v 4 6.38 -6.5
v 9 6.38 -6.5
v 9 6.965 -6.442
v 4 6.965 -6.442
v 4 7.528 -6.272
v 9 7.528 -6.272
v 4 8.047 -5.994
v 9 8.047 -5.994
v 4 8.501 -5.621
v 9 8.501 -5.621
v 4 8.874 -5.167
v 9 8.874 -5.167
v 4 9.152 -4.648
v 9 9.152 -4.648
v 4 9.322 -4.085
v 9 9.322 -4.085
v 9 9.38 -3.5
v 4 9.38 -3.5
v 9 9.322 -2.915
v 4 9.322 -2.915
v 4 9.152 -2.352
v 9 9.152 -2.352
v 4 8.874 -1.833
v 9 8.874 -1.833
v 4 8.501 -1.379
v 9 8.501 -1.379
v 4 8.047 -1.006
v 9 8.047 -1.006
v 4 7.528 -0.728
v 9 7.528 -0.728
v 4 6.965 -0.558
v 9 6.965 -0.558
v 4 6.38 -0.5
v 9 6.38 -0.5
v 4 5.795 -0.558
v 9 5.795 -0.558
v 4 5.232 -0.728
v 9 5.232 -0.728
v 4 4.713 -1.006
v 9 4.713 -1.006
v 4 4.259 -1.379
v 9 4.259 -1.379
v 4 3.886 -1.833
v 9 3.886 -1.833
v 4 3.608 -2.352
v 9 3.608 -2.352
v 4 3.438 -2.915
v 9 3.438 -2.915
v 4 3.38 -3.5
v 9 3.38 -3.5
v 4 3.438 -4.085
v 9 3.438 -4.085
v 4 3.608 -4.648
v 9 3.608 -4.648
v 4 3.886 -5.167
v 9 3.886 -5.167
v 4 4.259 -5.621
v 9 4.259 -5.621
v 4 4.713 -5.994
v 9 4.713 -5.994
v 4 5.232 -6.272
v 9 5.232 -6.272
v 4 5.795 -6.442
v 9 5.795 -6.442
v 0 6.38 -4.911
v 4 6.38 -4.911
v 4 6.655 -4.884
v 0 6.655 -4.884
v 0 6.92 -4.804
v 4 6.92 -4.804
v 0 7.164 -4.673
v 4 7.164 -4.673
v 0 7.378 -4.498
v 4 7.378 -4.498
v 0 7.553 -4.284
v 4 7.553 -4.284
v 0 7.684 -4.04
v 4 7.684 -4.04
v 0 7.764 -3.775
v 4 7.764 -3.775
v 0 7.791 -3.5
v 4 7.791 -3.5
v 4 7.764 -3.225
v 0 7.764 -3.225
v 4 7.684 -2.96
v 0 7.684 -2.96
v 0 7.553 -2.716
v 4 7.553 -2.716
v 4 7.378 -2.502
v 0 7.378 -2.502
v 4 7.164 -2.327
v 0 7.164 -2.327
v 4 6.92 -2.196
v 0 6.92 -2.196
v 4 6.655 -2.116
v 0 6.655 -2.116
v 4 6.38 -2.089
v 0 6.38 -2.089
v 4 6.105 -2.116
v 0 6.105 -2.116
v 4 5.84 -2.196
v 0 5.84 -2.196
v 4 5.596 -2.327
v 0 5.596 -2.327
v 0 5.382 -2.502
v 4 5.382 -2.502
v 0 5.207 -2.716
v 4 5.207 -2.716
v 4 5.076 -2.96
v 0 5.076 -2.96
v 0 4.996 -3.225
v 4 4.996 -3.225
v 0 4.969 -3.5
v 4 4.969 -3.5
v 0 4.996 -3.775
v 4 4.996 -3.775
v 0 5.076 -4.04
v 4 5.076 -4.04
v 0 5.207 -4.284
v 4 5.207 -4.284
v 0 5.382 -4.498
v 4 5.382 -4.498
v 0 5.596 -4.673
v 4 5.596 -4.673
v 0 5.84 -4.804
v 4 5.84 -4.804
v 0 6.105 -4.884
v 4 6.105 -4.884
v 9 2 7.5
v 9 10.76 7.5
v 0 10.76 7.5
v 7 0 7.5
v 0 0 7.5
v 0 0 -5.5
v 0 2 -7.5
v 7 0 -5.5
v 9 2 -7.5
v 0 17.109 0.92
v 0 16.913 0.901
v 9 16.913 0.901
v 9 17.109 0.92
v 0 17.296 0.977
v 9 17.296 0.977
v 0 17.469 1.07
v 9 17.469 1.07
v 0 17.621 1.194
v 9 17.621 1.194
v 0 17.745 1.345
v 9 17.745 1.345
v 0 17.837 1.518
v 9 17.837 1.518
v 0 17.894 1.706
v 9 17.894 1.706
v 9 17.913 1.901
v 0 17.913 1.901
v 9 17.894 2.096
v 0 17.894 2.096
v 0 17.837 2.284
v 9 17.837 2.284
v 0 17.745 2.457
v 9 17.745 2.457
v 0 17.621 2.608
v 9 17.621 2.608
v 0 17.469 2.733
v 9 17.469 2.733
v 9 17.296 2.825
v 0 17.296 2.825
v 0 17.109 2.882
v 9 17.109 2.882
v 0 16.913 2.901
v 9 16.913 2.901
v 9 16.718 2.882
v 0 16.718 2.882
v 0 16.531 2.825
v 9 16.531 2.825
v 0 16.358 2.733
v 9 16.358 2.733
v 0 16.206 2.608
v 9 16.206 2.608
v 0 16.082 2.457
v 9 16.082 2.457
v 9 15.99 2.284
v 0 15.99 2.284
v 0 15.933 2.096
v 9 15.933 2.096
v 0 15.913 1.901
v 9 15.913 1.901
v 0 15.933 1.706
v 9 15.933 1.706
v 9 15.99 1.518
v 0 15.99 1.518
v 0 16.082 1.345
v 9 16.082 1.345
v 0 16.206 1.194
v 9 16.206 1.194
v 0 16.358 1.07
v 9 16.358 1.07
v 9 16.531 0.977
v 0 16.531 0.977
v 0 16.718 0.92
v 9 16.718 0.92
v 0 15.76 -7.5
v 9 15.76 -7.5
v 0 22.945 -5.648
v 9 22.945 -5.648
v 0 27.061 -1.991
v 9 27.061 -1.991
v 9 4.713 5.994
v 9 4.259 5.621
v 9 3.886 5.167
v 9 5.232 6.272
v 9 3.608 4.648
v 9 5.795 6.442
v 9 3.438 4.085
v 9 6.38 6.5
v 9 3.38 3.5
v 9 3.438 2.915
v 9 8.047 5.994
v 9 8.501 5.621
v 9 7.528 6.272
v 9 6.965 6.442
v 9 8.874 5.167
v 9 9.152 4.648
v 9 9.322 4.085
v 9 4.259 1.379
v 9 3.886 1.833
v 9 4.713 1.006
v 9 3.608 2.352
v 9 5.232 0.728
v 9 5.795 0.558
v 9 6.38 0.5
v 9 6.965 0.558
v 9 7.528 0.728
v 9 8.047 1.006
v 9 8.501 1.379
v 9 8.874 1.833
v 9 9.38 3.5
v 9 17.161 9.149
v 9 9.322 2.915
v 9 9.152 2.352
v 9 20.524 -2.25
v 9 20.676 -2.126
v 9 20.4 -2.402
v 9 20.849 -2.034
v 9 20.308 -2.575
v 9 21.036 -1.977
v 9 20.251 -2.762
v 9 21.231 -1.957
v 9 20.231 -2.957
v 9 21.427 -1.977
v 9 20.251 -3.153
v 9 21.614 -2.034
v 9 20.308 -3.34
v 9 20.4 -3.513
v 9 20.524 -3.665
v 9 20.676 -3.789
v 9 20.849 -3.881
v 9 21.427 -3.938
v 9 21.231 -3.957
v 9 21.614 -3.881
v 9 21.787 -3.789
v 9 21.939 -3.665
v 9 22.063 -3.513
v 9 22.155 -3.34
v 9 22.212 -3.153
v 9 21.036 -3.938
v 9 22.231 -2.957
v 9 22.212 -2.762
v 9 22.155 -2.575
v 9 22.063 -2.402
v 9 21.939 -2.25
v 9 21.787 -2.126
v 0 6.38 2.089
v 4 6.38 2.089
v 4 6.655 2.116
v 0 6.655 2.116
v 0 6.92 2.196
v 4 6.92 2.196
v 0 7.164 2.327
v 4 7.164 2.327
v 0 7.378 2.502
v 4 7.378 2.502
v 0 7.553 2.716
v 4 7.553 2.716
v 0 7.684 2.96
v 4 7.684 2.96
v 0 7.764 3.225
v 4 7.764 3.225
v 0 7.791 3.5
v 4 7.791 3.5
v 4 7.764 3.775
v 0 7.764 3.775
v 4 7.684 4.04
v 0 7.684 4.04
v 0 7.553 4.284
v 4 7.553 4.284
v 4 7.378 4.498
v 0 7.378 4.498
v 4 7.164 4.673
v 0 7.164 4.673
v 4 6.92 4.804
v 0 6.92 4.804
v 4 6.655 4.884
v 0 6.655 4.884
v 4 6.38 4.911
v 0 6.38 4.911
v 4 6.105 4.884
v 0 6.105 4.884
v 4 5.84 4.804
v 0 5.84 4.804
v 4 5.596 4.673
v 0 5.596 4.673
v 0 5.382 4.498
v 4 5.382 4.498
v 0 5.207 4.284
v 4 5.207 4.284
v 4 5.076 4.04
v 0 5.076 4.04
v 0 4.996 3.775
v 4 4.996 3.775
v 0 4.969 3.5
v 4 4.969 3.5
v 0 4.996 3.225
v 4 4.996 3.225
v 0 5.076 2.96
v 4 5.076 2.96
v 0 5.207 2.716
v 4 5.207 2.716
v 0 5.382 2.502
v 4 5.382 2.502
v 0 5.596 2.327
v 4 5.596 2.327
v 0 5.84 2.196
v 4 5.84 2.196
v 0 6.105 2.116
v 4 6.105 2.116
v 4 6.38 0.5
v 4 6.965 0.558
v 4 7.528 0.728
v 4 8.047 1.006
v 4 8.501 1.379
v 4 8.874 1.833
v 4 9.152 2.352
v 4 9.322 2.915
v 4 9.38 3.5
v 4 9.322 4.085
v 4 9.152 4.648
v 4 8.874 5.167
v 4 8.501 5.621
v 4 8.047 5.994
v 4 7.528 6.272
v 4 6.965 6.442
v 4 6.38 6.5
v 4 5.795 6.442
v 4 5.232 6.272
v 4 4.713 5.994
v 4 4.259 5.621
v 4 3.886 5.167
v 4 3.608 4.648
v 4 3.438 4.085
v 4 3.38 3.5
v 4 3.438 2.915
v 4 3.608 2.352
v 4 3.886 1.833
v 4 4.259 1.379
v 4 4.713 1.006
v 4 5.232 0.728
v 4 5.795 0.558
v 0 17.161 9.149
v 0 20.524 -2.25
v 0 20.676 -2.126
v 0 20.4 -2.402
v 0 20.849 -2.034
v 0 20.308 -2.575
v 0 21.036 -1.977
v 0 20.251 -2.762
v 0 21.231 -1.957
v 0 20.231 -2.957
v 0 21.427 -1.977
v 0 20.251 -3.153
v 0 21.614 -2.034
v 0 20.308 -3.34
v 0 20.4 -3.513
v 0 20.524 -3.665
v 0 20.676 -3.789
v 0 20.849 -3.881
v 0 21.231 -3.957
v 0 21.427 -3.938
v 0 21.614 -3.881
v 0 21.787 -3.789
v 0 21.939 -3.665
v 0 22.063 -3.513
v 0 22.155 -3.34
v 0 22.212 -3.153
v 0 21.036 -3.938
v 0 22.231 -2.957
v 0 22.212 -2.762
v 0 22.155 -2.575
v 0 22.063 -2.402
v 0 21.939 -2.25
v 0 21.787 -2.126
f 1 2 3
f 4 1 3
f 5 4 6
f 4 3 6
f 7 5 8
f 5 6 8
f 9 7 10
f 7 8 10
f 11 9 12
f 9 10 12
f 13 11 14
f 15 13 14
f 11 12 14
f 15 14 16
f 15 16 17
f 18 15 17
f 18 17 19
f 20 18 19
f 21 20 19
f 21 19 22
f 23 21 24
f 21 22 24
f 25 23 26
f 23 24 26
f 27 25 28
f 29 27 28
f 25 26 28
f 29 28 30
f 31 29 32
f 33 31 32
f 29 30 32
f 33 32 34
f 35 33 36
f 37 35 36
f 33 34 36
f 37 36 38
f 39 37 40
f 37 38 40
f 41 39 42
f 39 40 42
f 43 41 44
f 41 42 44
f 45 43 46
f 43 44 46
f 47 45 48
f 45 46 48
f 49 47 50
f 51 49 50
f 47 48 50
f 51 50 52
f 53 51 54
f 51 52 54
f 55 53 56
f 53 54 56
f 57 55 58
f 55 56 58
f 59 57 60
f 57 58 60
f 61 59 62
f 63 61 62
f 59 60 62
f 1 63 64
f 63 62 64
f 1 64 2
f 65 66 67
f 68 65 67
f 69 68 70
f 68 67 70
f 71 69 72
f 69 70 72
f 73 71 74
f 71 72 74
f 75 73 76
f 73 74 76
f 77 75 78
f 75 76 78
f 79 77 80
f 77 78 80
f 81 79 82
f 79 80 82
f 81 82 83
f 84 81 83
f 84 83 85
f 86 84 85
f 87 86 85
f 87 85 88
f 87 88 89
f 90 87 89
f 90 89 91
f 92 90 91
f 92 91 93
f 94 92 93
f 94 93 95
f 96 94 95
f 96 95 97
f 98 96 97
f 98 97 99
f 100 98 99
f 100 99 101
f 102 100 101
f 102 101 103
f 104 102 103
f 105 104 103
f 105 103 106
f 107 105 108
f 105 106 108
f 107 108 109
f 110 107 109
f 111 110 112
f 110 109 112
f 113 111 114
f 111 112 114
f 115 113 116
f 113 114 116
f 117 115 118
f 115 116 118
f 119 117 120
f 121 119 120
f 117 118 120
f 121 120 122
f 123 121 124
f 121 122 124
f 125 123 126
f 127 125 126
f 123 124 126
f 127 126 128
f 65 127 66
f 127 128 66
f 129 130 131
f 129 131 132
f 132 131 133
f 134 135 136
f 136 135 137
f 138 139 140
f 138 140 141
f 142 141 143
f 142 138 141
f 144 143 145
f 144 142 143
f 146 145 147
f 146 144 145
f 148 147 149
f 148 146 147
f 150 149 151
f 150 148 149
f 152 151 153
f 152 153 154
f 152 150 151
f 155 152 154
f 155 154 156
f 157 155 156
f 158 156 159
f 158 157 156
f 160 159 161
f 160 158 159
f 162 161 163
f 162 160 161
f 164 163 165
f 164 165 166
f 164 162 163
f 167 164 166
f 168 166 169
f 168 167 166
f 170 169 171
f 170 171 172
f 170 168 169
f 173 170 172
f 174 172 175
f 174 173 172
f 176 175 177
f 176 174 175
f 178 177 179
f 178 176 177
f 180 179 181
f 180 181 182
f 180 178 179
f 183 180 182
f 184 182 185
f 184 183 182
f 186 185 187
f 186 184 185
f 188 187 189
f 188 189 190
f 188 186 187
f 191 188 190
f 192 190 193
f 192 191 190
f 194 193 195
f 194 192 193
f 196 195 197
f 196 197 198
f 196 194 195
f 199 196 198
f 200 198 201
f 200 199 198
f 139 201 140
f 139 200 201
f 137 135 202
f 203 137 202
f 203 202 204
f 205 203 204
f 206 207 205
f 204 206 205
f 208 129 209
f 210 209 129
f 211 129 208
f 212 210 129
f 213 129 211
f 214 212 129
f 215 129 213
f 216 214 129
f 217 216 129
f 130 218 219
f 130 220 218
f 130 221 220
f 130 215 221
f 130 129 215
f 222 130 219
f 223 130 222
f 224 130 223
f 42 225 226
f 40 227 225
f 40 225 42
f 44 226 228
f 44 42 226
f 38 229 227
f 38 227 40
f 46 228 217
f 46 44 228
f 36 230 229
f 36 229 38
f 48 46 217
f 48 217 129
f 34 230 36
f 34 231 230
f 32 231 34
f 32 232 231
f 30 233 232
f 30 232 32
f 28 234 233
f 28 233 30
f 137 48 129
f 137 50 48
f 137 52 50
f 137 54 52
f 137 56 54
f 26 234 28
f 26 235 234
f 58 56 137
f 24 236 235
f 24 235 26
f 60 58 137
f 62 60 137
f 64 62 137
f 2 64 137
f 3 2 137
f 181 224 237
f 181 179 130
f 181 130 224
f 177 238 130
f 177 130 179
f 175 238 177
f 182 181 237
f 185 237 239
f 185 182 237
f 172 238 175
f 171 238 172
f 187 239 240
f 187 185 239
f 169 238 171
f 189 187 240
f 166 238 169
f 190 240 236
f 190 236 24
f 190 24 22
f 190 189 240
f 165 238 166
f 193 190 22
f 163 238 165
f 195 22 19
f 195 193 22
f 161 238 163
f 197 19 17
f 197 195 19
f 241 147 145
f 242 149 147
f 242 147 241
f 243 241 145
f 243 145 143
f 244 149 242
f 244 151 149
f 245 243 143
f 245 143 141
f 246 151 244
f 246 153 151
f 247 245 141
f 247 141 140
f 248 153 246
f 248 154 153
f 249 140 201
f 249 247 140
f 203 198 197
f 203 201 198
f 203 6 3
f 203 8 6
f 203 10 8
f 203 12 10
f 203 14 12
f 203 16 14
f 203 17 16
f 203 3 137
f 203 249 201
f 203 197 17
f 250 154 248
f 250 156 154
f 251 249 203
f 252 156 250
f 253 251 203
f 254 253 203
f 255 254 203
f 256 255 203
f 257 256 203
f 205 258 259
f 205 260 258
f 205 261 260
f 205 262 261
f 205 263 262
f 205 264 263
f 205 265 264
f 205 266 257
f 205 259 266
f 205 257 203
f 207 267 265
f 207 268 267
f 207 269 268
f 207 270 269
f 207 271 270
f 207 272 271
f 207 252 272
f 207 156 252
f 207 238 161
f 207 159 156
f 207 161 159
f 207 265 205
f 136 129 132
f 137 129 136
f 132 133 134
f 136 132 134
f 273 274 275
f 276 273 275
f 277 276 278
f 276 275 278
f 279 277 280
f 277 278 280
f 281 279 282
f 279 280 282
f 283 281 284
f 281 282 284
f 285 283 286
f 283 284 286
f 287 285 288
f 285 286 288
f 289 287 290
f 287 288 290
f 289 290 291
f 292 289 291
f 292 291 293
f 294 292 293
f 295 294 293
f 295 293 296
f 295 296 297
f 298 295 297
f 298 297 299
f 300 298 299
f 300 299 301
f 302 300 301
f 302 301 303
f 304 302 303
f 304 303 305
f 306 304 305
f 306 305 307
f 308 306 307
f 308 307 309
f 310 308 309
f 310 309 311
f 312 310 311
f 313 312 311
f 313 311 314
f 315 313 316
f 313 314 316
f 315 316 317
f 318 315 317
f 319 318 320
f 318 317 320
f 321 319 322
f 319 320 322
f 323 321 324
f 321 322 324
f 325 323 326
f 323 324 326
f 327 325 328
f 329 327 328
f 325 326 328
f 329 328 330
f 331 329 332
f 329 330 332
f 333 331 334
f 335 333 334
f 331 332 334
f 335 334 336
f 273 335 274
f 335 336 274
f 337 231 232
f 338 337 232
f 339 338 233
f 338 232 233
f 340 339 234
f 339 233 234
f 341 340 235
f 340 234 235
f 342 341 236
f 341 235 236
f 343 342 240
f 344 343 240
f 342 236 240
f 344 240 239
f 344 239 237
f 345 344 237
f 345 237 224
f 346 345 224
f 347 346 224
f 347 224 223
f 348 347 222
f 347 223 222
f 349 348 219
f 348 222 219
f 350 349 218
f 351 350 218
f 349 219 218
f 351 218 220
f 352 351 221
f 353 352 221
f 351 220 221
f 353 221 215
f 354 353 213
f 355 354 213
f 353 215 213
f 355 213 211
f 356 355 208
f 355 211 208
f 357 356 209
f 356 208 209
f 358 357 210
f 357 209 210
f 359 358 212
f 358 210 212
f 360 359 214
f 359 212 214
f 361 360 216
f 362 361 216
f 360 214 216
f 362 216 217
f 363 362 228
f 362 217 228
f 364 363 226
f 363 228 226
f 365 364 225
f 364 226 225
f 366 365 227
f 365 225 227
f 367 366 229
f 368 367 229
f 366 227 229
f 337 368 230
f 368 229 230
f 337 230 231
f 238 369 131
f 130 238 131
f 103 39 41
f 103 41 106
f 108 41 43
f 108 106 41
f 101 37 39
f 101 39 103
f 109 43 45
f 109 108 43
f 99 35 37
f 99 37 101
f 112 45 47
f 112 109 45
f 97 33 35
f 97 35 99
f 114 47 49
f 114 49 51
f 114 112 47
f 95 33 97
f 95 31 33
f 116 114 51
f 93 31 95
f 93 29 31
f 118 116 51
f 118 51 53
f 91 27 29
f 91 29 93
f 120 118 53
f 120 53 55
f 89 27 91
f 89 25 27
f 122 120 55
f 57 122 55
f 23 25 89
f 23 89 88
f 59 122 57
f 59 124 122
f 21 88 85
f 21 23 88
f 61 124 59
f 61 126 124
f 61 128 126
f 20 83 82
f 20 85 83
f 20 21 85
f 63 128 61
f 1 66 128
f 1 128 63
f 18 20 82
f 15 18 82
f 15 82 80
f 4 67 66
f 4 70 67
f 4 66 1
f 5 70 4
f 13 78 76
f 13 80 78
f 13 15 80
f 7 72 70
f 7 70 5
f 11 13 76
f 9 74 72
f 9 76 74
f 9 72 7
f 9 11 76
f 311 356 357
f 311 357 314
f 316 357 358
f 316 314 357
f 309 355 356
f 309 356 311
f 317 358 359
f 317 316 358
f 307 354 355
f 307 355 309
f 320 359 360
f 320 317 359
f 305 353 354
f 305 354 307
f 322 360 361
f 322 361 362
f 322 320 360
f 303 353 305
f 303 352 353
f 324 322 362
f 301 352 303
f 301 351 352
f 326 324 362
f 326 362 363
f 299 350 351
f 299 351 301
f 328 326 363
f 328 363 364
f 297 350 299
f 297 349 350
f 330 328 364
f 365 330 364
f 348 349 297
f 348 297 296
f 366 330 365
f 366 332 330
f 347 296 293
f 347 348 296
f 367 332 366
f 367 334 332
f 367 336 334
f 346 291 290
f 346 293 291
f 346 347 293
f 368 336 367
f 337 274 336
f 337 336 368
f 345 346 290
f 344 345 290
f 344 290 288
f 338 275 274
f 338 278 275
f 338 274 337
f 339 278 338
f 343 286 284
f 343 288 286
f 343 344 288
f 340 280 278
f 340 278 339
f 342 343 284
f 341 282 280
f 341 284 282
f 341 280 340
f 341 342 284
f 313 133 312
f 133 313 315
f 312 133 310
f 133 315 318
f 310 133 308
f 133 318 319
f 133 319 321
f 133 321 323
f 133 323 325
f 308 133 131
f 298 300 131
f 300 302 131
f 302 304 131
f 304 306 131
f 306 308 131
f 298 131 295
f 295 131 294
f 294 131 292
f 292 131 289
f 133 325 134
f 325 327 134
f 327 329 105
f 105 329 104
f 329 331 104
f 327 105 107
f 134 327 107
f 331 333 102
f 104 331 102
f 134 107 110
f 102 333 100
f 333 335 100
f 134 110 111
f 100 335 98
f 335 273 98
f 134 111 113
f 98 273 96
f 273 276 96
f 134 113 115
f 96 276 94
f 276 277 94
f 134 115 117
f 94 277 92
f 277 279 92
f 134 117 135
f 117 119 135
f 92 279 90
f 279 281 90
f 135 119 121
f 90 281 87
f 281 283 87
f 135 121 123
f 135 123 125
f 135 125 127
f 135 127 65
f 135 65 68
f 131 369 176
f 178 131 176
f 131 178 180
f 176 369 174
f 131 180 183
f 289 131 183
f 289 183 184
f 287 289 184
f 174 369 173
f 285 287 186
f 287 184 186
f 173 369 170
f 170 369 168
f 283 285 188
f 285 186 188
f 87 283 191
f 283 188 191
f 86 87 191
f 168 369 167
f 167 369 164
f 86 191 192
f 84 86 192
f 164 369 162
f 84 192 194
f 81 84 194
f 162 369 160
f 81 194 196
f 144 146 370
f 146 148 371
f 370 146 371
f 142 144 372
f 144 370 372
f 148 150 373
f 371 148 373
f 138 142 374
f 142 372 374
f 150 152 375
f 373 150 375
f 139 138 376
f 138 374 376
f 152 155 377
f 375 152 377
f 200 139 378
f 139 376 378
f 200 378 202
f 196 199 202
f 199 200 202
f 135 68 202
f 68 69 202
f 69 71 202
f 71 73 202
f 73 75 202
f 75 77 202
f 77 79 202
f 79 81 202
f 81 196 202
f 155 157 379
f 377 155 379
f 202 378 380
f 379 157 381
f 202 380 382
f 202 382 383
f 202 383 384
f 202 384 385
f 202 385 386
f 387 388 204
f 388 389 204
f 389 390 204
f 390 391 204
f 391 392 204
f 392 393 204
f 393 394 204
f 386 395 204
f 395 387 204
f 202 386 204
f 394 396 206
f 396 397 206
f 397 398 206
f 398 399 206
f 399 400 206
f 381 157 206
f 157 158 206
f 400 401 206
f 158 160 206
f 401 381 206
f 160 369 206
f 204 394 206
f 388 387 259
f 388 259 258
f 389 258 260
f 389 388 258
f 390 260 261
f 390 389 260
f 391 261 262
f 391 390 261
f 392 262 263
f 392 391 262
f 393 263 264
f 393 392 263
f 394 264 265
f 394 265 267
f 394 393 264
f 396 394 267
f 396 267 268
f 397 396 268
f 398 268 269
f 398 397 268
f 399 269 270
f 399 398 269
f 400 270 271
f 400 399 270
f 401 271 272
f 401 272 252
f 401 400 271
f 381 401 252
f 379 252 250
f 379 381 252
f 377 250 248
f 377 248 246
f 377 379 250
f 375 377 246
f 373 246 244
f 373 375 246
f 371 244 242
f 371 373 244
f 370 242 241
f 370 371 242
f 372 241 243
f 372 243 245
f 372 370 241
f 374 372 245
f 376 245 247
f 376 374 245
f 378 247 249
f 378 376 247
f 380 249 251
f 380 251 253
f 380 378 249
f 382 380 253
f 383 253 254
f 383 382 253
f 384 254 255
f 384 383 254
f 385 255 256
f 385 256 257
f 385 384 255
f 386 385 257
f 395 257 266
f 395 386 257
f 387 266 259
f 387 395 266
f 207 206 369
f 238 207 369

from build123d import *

# Parameters (mm, degrees)
SKETCH1_R           = 1
BOSS_EXTRUDE1_DEPTH = 9
CHAMFER1_SIZE       = 2
SKETCH5_R           = 1.411016717
CUT_EXTRUDE4_DEPTH  = 32.657609573
CUT_EXTRUDE5_DEPTH  = 32.657609573
SKETCH7_R           = 3
CUT_EXTRUDE6_DEPTH  = 5


with BuildPart() as part:
    # Sketch1 → Boss-Extrude1 (new body)
    with BuildSketch(Plane(origin=(0, 0, 0), x_dir=(0, 0, -1), z_dir=(1, 0, 0))):
        Polygon((-7.5, 0), (7.5, 0), (7.5, 15.76), (4.103828097, 28.939458123), (-9.149426619, 17.160897736), (-7.5, 10.76), align=None)
        with Locations((2.957491833, 21.231429279)):
            Circle(SKETCH1_R, mode=Mode.SUBTRACT)
        with Locations((-1.901052893, 16.913496539)):
            Circle(SKETCH1_R, mode=Mode.SUBTRACT)
    extrude(amount=BOSS_EXTRUDE1_DEPTH)

    # Chamfer1
    chamfer1_edges = [part.edges().sort_by_distance(p)[0] for p in [
        (4.5, 0, -7.5),
        (9, 0, 0),
    ]]
    chamfer(chamfer1_edges, length=CHAMFER1_SIZE)

    # Sketch5 → Cut-Extrude4 (cut, through all)
    with BuildSketch(Plane(origin=(9, 0, 0), x_dir=(0, 0, -1), z_dir=(1, 0, 0))):
        with Locations((3.500000028, 6.380001803)):
            Circle(SKETCH5_R)
        with Locations((-3.5, 6.380001848)):
            Circle(SKETCH5_R)
    extrude(amount=-CUT_EXTRUDE4_DEPTH, mode=Mode.SUBTRACT)

    # Sketch6 → Cut-Extrude5 (cut, through all)
    with BuildSketch(Plane(origin=(9, 0, 0), x_dir=(0, 0, -1), z_dir=(1, 0, 0))):
        Polygon((1.990530631, 27.061308011), (5.648400148, 22.945467464), (4.103828097, 28.939458123), align=None)
    extrude(amount=-CUT_EXTRUDE5_DEPTH, mode=Mode.SUBTRACT)

    # Sketch7 → Cut-Extrude6 (cut)
    with BuildSketch(Plane(origin=(9, 0, 0), x_dir=(0, 0, -1), z_dir=(1, 0, 0))):
        with Locations((3.500000028, 6.380001803)):
            Circle(SKETCH7_R)
        with Locations((-3.5, 6.380001848)):
            Circle(SKETCH7_R)
    extrude(amount=-CUT_EXTRUDE6_DEPTH, mode=Mode.SUBTRACT)


solid = part.part
